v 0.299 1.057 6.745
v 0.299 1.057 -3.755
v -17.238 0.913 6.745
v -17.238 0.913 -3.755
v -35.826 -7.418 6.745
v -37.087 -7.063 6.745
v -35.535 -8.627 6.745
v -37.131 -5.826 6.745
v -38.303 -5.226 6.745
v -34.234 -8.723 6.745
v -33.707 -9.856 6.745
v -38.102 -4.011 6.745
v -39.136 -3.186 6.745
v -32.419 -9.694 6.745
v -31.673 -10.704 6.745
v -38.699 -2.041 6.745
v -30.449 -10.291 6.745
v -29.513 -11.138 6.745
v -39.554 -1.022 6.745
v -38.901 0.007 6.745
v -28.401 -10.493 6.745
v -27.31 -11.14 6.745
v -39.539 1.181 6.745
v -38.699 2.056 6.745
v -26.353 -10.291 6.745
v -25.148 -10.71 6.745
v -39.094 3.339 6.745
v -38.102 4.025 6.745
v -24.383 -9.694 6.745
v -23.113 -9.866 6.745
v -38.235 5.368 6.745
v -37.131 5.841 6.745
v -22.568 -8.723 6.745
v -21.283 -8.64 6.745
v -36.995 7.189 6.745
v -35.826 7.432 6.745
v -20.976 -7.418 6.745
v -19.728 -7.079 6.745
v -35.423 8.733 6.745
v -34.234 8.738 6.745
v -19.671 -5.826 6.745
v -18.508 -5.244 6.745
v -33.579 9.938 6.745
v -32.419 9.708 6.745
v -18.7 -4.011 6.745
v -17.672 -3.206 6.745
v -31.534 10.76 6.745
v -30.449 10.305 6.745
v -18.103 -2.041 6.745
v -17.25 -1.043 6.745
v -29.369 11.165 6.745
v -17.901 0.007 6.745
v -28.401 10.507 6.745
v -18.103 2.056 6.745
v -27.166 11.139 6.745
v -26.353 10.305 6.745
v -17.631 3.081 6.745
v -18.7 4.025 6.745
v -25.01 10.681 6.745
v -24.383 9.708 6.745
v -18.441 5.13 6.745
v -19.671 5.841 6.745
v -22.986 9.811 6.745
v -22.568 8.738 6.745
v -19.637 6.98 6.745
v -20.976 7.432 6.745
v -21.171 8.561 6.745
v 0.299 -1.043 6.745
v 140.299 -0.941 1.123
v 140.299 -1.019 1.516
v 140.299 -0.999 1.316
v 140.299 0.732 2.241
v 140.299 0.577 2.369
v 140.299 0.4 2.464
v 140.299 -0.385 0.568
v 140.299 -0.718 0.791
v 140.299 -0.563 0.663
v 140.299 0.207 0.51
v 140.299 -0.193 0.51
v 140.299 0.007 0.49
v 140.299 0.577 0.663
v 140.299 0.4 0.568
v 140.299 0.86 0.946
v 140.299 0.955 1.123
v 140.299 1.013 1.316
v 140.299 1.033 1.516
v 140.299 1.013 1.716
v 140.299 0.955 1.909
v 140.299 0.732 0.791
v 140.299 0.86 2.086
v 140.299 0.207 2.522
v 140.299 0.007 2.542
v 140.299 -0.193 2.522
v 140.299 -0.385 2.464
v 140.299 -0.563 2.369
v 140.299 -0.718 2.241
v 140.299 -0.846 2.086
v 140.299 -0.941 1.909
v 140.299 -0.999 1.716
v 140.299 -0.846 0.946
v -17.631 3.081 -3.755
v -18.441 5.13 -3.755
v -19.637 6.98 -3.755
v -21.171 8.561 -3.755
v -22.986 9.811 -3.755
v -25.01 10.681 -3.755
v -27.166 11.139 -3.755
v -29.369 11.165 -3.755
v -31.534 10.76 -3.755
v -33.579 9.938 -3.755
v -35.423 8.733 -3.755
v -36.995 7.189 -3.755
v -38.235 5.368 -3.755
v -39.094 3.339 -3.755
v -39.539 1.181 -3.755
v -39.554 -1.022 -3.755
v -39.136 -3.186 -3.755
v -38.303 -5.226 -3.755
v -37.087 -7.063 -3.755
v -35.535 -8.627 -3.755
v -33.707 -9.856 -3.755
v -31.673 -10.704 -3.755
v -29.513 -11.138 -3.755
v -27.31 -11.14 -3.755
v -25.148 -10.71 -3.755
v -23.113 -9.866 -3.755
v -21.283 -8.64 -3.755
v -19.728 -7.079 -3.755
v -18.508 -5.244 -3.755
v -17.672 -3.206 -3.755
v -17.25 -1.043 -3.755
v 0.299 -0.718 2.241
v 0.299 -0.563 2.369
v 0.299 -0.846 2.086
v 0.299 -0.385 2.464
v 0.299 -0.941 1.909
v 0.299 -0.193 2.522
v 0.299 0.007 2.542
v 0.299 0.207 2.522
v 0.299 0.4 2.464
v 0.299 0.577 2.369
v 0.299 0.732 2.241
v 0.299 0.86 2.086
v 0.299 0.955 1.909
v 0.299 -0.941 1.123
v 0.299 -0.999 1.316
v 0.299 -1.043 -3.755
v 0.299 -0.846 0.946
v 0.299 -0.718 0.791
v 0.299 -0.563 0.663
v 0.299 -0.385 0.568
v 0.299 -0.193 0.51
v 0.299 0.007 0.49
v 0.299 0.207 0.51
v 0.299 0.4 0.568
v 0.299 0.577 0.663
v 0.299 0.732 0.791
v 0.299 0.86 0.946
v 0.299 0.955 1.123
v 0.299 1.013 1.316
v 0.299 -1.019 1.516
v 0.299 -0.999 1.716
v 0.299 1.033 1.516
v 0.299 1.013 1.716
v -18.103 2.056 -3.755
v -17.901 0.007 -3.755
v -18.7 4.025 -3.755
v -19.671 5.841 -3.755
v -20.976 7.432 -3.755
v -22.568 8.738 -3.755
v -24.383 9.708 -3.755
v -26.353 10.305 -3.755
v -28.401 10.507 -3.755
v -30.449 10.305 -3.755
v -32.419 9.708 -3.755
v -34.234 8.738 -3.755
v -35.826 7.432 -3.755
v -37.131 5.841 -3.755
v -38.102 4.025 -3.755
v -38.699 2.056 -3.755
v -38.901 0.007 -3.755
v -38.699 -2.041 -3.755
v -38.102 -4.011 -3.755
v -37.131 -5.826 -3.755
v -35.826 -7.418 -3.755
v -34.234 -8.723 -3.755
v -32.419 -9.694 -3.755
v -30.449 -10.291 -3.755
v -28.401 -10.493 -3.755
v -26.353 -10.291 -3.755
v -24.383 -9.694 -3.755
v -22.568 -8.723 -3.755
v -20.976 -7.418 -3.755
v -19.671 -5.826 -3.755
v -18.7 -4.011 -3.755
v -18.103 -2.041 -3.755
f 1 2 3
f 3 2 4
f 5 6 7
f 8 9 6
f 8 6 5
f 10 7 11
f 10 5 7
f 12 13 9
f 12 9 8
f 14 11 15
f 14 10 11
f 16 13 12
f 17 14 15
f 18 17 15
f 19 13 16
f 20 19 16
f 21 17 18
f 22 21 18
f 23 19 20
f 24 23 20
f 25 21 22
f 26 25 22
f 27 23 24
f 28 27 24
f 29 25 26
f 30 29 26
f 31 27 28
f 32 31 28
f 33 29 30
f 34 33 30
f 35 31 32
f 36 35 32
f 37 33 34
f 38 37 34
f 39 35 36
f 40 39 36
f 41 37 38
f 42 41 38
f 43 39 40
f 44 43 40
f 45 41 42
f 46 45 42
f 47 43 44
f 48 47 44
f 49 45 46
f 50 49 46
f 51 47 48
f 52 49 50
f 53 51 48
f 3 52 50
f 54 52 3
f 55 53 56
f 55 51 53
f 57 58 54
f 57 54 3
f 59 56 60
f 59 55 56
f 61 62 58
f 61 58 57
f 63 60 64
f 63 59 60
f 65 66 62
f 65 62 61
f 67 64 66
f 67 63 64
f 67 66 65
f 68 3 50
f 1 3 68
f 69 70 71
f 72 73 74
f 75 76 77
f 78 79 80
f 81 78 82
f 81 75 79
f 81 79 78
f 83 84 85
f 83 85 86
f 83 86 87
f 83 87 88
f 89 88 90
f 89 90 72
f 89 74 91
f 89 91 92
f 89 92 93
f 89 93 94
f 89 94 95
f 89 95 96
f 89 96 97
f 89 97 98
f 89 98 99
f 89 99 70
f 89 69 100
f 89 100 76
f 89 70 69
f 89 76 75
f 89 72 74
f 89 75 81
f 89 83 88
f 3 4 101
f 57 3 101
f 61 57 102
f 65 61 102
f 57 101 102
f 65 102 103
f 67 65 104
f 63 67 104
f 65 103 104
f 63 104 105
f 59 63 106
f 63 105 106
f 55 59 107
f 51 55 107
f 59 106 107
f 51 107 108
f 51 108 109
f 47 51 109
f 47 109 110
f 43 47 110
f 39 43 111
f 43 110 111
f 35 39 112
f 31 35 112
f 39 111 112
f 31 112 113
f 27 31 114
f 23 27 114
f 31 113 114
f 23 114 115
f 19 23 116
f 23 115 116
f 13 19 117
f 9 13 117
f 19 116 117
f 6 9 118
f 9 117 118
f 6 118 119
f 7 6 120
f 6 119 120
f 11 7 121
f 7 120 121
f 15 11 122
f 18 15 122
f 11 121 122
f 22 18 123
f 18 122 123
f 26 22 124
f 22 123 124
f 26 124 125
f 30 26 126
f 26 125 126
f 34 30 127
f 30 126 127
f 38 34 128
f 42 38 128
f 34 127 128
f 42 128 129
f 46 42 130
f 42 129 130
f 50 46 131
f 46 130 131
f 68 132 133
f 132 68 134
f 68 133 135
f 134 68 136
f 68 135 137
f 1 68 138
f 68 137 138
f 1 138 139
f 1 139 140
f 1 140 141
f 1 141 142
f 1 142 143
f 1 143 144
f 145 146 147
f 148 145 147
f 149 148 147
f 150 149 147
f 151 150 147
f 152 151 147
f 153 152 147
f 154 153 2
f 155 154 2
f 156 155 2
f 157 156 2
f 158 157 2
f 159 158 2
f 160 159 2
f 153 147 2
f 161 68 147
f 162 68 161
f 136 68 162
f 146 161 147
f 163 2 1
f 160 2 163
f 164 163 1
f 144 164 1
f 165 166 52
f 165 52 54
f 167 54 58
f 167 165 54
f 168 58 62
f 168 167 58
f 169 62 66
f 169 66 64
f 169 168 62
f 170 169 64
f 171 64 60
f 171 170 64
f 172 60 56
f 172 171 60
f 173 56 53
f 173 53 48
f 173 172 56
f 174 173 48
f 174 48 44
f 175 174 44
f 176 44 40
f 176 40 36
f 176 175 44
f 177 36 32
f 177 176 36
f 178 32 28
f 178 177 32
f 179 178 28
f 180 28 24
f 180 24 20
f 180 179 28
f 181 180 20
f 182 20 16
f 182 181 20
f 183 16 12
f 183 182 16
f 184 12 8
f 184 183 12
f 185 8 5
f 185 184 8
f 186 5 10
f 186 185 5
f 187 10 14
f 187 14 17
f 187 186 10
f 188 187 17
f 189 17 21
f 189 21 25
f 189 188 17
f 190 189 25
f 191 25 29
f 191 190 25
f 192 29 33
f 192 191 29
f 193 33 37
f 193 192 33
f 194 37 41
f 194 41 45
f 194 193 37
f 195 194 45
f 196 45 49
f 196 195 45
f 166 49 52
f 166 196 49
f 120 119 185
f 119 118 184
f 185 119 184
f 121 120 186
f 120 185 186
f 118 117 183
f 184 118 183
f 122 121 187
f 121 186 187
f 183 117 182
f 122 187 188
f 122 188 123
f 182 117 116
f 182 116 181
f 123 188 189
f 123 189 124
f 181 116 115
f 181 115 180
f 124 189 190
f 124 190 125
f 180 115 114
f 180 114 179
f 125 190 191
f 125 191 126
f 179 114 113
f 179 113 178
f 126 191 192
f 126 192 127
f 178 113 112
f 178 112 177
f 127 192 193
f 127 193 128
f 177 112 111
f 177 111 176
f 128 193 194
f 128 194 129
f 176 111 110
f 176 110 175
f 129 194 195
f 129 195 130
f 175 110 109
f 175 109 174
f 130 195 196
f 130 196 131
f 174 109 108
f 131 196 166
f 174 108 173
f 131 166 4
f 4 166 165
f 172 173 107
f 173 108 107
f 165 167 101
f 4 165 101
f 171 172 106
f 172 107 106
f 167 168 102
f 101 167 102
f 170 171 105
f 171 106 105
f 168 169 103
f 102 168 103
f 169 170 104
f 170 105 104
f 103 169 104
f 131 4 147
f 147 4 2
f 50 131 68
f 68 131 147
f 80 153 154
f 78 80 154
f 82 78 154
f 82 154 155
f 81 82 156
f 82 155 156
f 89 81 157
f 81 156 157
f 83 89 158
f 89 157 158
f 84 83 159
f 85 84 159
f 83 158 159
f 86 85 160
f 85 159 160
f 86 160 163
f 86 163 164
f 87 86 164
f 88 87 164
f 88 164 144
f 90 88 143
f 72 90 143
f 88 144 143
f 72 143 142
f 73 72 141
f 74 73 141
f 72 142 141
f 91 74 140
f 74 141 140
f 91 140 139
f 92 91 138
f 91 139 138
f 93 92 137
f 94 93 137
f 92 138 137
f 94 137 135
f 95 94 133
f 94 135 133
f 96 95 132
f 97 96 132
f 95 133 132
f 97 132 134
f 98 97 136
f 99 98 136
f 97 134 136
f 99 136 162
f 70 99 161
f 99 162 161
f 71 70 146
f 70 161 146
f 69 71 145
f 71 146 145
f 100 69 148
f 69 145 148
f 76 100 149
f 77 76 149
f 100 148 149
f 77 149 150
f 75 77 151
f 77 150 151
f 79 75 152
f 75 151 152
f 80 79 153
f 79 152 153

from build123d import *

# Parameters (mm, degrees)
SKETCH_1_R      = 3
EXTRUDE_1_DEPTH = 3
SKETCH_2_R      = 0.293076877
EXTRUDE_2_DEPTH = 40
SCALE_1_SCALE   = 3.5


with BuildPart() as part:
    # 草图1 → 凸台-拉伸1 (new body)
    with BuildSketch(Plane.XY):
        with BuildLine():
            Line((8.2, 0.3), (3.189519169, 0.258780744))
            ThreePointArc((3.189519169, 0.258780744), (-3.199933121, 0.020688637), (3.185906464, -0.3))
            Line((3.185906464, -0.3), (8.2, -0.3))
            Line((8.2, -0.3), (8.2, 0.3))
        make_face()
        Circle(SKETCH_1_R, mode=Mode.SUBTRACT)
    extrude(amount=EXTRUDE_1_DEPTH)

    # 草图2 → 凸台-拉伸2 (add)
    with BuildSketch(Plane(origin=(8.2, 0, 0), x_dir=(0, 0, -1), z_dir=(1, 0, 0))):
        with Locations((-1.506058585, 0)):
            Circle(SKETCH_2_R)
    extrude(amount=EXTRUDE_2_DEPTH)


with BuildPart() as part_1:
    # 缩放比例1: scaled about (11.360396765, -0.00284627, 1.502097409)
    add(part.part.scale(SCALE_1_SCALE).moved(Location((-28.400991913, 0.007115675, -3.755243523))))


solid = part_1.part
